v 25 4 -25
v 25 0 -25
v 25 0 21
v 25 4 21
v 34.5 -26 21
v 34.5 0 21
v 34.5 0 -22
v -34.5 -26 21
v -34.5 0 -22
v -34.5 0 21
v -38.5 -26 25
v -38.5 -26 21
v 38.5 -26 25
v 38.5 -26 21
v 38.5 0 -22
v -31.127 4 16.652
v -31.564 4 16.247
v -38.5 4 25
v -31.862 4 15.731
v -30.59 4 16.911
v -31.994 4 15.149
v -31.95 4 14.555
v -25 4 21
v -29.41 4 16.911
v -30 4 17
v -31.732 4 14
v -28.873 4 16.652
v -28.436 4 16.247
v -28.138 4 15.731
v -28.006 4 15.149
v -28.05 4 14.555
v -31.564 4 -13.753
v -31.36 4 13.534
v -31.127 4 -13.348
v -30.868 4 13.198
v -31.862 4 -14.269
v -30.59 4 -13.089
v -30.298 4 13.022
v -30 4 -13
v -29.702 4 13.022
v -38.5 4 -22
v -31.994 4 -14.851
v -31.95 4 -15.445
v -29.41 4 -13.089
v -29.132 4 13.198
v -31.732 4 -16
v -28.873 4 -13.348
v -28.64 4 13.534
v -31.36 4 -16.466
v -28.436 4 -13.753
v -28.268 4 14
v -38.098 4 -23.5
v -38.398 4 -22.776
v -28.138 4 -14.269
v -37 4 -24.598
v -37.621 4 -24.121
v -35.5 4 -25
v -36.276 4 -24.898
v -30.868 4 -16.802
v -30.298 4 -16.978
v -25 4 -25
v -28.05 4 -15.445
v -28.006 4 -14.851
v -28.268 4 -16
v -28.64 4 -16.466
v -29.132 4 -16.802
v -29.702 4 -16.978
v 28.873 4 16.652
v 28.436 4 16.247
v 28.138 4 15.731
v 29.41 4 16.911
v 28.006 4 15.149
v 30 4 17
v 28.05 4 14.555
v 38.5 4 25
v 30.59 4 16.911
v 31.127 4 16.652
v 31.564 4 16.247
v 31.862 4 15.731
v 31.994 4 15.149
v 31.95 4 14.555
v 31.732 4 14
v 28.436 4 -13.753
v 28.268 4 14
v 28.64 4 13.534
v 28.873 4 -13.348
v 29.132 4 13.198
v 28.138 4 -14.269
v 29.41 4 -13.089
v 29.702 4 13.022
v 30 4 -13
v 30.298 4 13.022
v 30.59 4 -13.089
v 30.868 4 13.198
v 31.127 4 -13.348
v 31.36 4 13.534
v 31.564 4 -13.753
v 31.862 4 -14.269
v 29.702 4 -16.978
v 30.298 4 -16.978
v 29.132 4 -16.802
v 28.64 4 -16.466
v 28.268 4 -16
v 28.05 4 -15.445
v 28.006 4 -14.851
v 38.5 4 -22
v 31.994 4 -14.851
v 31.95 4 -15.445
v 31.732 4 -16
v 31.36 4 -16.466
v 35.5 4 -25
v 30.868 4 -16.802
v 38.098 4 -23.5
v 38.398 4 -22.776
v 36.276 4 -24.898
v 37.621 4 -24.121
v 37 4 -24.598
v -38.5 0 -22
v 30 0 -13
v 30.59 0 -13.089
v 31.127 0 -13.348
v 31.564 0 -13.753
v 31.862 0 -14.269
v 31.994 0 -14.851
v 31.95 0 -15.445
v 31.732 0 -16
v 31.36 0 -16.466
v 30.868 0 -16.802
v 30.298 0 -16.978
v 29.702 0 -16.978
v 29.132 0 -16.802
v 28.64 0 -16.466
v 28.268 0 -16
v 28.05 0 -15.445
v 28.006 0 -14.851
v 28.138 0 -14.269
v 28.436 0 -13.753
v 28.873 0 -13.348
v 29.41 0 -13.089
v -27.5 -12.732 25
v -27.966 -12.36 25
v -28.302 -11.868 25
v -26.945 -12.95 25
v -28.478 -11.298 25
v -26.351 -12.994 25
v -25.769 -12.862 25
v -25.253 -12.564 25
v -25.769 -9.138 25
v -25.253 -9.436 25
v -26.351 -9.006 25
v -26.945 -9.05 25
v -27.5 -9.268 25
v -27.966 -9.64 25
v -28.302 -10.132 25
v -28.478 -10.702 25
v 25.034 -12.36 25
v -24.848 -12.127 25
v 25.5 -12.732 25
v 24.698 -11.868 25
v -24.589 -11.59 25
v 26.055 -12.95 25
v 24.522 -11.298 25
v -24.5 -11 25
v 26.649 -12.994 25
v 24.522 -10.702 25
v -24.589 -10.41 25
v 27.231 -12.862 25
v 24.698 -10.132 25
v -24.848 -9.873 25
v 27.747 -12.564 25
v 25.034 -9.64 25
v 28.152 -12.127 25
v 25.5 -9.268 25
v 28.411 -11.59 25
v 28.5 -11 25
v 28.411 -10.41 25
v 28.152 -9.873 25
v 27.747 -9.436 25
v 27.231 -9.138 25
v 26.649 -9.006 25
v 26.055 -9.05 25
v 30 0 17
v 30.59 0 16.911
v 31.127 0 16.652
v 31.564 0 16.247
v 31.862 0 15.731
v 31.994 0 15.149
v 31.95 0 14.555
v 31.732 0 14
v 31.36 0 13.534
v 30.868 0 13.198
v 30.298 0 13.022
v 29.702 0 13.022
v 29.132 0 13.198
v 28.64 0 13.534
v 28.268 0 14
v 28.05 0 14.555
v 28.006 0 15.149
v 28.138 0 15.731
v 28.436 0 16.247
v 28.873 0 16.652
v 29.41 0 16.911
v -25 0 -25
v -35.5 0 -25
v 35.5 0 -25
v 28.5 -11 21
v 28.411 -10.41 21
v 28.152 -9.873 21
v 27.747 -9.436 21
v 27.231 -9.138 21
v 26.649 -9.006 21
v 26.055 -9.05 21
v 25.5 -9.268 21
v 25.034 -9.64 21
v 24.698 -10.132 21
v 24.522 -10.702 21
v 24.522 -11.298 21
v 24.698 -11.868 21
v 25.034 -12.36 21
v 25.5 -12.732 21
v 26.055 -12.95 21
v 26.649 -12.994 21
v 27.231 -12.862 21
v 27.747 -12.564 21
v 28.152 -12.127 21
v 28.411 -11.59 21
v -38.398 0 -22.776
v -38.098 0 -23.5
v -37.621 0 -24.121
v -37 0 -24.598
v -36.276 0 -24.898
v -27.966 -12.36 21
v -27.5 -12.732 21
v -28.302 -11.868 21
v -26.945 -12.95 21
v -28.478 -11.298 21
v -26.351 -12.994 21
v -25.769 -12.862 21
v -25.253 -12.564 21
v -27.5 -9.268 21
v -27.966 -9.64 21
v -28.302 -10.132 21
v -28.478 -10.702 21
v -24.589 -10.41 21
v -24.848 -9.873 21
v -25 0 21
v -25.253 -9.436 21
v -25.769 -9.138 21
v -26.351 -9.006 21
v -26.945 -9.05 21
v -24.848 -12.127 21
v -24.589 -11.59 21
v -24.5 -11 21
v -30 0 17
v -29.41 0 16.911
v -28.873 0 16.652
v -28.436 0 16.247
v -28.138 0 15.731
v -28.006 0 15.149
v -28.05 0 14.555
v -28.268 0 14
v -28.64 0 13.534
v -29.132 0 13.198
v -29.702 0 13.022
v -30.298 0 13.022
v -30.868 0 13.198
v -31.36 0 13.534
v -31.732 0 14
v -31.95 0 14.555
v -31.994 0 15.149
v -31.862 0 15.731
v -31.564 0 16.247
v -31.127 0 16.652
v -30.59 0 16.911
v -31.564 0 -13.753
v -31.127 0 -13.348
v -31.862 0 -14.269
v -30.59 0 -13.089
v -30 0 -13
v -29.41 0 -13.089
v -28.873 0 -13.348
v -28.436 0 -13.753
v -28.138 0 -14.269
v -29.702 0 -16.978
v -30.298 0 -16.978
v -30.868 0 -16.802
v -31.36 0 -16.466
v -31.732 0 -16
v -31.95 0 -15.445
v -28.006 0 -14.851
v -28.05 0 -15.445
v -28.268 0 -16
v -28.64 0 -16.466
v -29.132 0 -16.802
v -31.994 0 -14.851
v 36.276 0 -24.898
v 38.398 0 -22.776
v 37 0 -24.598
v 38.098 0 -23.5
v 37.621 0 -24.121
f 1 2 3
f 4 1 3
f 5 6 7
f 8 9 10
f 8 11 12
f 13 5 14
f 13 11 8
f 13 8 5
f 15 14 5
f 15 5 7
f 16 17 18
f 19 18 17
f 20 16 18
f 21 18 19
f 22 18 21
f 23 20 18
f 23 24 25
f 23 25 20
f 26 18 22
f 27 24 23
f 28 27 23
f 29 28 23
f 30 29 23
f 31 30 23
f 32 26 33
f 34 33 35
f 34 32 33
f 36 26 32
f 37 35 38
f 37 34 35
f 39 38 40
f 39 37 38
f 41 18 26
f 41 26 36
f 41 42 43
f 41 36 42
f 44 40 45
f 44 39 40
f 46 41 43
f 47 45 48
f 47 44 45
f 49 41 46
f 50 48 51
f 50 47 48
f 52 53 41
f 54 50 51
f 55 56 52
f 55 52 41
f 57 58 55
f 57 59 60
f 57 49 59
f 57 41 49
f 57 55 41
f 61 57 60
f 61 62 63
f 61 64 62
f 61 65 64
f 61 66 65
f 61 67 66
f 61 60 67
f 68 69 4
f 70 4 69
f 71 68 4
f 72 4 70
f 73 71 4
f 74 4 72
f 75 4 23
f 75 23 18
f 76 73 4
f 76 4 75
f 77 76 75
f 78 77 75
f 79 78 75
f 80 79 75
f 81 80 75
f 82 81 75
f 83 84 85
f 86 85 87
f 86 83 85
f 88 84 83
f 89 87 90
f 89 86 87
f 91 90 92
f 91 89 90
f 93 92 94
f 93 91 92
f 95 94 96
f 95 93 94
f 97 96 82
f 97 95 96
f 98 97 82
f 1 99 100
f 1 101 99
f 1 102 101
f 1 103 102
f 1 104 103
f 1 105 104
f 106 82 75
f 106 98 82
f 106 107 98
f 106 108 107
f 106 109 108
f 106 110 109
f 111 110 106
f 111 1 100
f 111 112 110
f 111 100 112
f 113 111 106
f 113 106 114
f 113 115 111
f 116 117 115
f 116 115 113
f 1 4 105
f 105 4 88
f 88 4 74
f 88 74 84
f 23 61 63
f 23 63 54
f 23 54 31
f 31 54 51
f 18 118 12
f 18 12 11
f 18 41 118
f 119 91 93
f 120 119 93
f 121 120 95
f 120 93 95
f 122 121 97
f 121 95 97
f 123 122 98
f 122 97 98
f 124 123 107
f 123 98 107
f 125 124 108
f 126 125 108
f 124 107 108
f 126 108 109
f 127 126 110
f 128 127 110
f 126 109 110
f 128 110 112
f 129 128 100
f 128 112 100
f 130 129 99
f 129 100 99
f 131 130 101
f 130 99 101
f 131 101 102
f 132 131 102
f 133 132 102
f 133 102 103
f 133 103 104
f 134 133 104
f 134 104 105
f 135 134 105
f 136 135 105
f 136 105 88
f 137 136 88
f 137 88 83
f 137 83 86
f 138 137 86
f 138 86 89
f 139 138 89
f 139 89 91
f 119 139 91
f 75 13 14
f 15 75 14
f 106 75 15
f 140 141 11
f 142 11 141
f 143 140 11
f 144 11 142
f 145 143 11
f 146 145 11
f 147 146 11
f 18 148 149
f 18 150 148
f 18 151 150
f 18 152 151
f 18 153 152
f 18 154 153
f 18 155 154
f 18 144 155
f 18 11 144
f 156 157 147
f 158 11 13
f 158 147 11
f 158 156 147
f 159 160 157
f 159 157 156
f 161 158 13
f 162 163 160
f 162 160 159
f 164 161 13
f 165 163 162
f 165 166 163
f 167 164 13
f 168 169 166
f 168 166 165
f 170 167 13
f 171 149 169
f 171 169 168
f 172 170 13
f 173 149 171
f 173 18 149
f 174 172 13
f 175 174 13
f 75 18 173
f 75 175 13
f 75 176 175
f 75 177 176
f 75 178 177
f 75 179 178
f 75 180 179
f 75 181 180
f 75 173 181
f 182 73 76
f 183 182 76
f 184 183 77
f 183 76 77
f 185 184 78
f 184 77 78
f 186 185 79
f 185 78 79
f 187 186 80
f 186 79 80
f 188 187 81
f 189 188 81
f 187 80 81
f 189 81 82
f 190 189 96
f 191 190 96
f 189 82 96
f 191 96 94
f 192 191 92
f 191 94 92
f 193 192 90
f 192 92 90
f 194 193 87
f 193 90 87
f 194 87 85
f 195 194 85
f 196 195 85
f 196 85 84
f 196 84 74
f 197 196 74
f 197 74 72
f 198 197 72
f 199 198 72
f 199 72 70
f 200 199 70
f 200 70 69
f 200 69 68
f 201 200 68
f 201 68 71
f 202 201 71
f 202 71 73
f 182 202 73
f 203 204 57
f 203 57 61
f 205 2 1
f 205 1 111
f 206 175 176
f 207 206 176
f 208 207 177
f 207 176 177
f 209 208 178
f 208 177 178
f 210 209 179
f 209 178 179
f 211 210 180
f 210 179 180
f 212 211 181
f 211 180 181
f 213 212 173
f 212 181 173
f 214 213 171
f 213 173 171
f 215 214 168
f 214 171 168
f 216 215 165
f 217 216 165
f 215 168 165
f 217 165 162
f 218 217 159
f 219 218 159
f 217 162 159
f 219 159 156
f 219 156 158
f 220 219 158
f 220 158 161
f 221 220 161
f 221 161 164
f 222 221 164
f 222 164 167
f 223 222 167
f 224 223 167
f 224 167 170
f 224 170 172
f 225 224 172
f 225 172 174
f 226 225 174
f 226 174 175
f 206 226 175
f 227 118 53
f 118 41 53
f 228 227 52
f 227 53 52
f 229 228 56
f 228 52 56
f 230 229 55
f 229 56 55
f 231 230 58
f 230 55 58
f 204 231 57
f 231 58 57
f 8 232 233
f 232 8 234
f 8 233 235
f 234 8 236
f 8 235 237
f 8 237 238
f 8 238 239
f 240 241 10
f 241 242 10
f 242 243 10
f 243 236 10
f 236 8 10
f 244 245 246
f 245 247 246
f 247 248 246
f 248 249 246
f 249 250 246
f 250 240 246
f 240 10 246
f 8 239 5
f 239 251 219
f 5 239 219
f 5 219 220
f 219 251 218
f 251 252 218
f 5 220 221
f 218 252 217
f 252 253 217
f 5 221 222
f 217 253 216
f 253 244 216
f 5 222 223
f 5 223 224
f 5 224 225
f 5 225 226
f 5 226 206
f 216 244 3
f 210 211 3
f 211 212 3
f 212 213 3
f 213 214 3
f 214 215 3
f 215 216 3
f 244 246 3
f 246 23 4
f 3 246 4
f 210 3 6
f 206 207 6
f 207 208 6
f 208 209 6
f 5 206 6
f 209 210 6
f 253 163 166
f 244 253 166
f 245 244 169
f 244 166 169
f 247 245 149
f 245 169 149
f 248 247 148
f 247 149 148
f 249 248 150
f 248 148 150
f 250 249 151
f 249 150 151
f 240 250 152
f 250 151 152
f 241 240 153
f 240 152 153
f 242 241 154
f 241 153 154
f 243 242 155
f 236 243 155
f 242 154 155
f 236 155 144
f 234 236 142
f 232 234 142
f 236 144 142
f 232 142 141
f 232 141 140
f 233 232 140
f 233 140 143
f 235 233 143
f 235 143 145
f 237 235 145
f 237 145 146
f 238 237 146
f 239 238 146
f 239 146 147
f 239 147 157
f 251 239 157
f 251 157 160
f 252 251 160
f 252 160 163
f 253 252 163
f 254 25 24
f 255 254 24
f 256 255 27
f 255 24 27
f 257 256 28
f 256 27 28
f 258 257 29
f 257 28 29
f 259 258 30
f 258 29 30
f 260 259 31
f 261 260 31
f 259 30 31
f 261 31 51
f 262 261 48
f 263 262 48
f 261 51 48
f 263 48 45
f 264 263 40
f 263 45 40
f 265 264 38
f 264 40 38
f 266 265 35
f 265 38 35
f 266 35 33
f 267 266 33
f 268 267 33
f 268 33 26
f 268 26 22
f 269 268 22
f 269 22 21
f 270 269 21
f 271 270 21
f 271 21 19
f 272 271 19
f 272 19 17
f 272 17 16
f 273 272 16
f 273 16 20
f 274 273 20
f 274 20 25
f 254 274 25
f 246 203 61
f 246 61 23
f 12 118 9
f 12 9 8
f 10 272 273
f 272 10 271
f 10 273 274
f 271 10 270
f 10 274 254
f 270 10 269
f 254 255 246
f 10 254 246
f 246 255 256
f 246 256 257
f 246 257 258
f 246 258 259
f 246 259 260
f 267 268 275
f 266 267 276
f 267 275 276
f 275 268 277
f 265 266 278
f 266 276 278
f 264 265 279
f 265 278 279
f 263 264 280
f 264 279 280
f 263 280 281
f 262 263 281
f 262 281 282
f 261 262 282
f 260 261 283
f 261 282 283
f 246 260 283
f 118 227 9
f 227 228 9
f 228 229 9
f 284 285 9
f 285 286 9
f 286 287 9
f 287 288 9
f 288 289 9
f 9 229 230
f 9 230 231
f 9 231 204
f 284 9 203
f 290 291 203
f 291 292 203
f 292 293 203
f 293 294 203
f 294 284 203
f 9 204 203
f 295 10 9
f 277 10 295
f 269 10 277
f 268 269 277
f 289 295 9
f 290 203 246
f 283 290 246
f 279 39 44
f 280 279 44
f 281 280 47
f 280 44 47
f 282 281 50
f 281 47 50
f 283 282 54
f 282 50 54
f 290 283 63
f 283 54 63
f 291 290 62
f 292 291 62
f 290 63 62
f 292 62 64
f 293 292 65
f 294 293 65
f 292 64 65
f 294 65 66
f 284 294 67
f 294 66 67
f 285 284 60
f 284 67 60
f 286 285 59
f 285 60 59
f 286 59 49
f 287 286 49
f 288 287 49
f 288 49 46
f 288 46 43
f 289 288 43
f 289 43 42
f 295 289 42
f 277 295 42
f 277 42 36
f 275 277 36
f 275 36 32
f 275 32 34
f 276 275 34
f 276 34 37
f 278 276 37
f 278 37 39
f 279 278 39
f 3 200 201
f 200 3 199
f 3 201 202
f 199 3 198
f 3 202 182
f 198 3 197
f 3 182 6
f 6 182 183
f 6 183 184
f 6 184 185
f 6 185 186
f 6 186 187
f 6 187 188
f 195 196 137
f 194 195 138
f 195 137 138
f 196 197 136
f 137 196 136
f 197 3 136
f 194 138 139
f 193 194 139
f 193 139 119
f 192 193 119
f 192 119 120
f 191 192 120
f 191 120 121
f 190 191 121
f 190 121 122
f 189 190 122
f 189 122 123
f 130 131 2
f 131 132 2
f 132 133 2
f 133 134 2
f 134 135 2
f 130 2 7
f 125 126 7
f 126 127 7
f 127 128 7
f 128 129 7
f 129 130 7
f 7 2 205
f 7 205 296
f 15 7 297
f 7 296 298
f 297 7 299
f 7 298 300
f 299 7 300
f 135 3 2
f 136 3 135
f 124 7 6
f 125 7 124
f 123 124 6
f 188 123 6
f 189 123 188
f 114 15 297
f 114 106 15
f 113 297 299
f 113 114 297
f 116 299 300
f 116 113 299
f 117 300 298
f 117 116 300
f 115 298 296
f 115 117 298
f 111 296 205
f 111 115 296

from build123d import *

# Parameters (mm, degrees)
SZKIC2_W                    = 77
SZKIC2_H                    = 50
DODANIE_WYCI_GNI_CIE2_DEPTH = 4
SZKIC4_W                    = 50
SZKIC4_H                    = 46
WYTNIJ_WYCI_GNI_CIE1_DEPTH  = 4
SZKIC5_W                    = 77
SZKIC5_H                    = 4
DODANIE_WYCI_GNI_CIE3_DEPTH = 26
WYTNIJ_WYCI_GNI_CIE2_REACH  = 70.251
SZKIC6_R                    = 2
ZAOKR_GLENIE1_R             = 3
DODANIE_WYCI_GNI_CIE4_DEPTH = 4
DODANIE_WYCI_GNI_CIE5_DEPTH = 4
WYTNIJ_WYCI_GNI_CIE5_REACH  = 56.838
SZKIC9_R                    = 2


with BuildPart() as part:
    # Szkic2 → Dodanie-wyciągnięcie2 (new body)
    with BuildSketch(Plane(origin=(0, 0, 0), x_dir=(1, 0, 0), z_dir=(0, 1, 0))):
        Rectangle(SZKIC2_W, SZKIC2_H)
    extrude(amount=DODANIE_WYCI_GNI_CIE2_DEPTH)

    # Szkic4 → Wytnij-wyciągnięcie1 (cut)
    with BuildSketch(Plane.XZ):
        with Locations((0, -2)):
            Rectangle(SZKIC4_W, SZKIC4_H)
    extrude(amount=-WYTNIJ_WYCI_GNI_CIE1_DEPTH, mode=Mode.SUBTRACT)

    # Szkic5 → Dodanie-wyciągnięcie3 (add)
    with BuildSketch(Plane.XZ):
        with Locations((0, 23)):
            Rectangle(SZKIC5_W, SZKIC5_H)
    extrude(amount=DODANIE_WYCI_GNI_CIE3_DEPTH)

    # Szkic6 → Wytnij-wyciągnięcie2 (cut, up to next)
    with BuildSketch(Plane.XY.offset(25), mode=Mode.PRIVATE) as wytnij_wyci_gni_cie2_sk1:
        with Locations((26.5, -11)):
            Circle(SZKIC6_R)
    wytnij_wyci_gni_cie2_tool1 = extrude(wytnij_wyci_gni_cie2_sk1.sketch, amount=-WYTNIJ_WYCI_GNI_CIE2_REACH, mode=Mode.PRIVATE) & part.part
    # Szkic6 → Wytnij-wyciągnięcie2 (cut, up to next)
    with BuildSketch(Plane.XY.offset(25), mode=Mode.PRIVATE) as wytnij_wyci_gni_cie2_sk2:
        with Locations((-26.5, -11)):
            Circle(SZKIC6_R)
    wytnij_wyci_gni_cie2_tool2 = extrude(wytnij_wyci_gni_cie2_sk2.sketch, amount=-WYTNIJ_WYCI_GNI_CIE2_REACH, mode=Mode.PRIVATE) & part.part
    add(wytnij_wyci_gni_cie2_tool1.solids().sort_by_distance((26.5, -11, 25))[0], mode=Mode.SUBTRACT)
    add(wytnij_wyci_gni_cie2_tool2.solids().sort_by_distance((-26.5, -11, 25))[0], mode=Mode.SUBTRACT)

    # Zaokrąglenie1
    zaokr_glenie1_edges = [part.edges().sort_by_distance(p)[0] for p in [
        (-38.5, 2, -25),
        (38.5, 2, -25),
    ]]
    fillet(zaokr_glenie1_edges, radius=ZAOKR_GLENIE1_R)

    # Szkic7 → Dodanie-wyciągnięcie4 (add)
    with BuildSketch(Plane.ZY.offset(38.5)):
        Polygon((21, -26), (21, 0), (-22, 0), align=None)
    extrude(amount=-DODANIE_WYCI_GNI_CIE4_DEPTH)

    # Szkic8 → Dodanie-wyciągnięcie5 (add)
    with BuildSketch(Plane(origin=(38.5, 0, 0), x_dir=(0, 0, -1), z_dir=(1, 0, 0))):
        Polygon((-21, -26), (22, 0), (-21, 0), align=None)
    extrude(amount=-DODANIE_WYCI_GNI_CIE5_DEPTH)

    # Szkic9 → Wytnij-wyciągnięcie5 (cut, up to next)
    with BuildSketch(Plane(origin=(0, 4, 0), x_dir=(1, 0, 0), z_dir=(0, 1, 0)), mode=Mode.PRIVATE) as wytnij_wyci_gni_cie5_sk1:
        with Locations(Location((-30, 15, 0), (0, 0, 270))):
            Circle(SZKIC9_R)
    wytnij_wyci_gni_cie5_tool1 = extrude(wytnij_wyci_gni_cie5_sk1.sketch, amount=-WYTNIJ_WYCI_GNI_CIE5_REACH, mode=Mode.PRIVATE) & part.part
    # Szkic9 → Wytnij-wyciągnięcie5 (cut, up to next)
    with BuildSketch(Plane(origin=(0, 4, 0), x_dir=(1, 0, 0), z_dir=(0, 1, 0)), mode=Mode.PRIVATE) as wytnij_wyci_gni_cie5_sk2:
        with Locations(Location((-30, -15, 0), (0, 0, 270))):
            Circle(SZKIC9_R)
    wytnij_wyci_gni_cie5_tool2 = extrude(wytnij_wyci_gni_cie5_sk2.sketch, amount=-WYTNIJ_WYCI_GNI_CIE5_REACH, mode=Mode.PRIVATE) & part.part
    # Szkic9 → Wytnij-wyciągnięcie5 (cut, up to next)
    with BuildSketch(Plane(origin=(0, 4, 0), x_dir=(1, 0, 0), z_dir=(0, 1, 0)), mode=Mode.PRIVATE) as wytnij_wyci_gni_cie5_sk3:
        with Locations(Location((30, 15, 0), (0, 0, 270))):
            Circle(SZKIC9_R)
    wytnij_wyci_gni_cie5_tool3 = extrude(wytnij_wyci_gni_cie5_sk3.sketch, amount=-WYTNIJ_WYCI_GNI_CIE5_REACH, mode=Mode.PRIVATE) & part.part
    # Szkic9 → Wytnij-wyciągnięcie5 (cut, up to next)
    with BuildSketch(Plane(origin=(0, 4, 0), x_dir=(1, 0, 0), z_dir=(0, 1, 0)), mode=Mode.PRIVATE) as wytnij_wyci_gni_cie5_sk4:
        with Locations(Location((30, -15, 0), (0, 0, 270))):
            Circle(SZKIC9_R)
    wytnij_wyci_gni_cie5_tool4 = extrude(wytnij_wyci_gni_cie5_sk4.sketch, amount=-WYTNIJ_WYCI_GNI_CIE5_REACH, mode=Mode.PRIVATE) & part.part
    add(wytnij_wyci_gni_cie5_tool1.solids().sort_by_distance((-30, 4, -15))[0], mode=Mode.SUBTRACT)
    add(wytnij_wyci_gni_cie5_tool2.solids().sort_by_distance((-30, 4, 15))[0], mode=Mode.SUBTRACT)
    add(wytnij_wyci_gni_cie5_tool3.solids().sort_by_distance((30, 4, -15))[0], mode=Mode.SUBTRACT)
    add(wytnij_wyci_gni_cie5_tool4.solids().sort_by_distance((30, 4, 15))[0], mode=Mode.SUBTRACT)


solid = part.part
